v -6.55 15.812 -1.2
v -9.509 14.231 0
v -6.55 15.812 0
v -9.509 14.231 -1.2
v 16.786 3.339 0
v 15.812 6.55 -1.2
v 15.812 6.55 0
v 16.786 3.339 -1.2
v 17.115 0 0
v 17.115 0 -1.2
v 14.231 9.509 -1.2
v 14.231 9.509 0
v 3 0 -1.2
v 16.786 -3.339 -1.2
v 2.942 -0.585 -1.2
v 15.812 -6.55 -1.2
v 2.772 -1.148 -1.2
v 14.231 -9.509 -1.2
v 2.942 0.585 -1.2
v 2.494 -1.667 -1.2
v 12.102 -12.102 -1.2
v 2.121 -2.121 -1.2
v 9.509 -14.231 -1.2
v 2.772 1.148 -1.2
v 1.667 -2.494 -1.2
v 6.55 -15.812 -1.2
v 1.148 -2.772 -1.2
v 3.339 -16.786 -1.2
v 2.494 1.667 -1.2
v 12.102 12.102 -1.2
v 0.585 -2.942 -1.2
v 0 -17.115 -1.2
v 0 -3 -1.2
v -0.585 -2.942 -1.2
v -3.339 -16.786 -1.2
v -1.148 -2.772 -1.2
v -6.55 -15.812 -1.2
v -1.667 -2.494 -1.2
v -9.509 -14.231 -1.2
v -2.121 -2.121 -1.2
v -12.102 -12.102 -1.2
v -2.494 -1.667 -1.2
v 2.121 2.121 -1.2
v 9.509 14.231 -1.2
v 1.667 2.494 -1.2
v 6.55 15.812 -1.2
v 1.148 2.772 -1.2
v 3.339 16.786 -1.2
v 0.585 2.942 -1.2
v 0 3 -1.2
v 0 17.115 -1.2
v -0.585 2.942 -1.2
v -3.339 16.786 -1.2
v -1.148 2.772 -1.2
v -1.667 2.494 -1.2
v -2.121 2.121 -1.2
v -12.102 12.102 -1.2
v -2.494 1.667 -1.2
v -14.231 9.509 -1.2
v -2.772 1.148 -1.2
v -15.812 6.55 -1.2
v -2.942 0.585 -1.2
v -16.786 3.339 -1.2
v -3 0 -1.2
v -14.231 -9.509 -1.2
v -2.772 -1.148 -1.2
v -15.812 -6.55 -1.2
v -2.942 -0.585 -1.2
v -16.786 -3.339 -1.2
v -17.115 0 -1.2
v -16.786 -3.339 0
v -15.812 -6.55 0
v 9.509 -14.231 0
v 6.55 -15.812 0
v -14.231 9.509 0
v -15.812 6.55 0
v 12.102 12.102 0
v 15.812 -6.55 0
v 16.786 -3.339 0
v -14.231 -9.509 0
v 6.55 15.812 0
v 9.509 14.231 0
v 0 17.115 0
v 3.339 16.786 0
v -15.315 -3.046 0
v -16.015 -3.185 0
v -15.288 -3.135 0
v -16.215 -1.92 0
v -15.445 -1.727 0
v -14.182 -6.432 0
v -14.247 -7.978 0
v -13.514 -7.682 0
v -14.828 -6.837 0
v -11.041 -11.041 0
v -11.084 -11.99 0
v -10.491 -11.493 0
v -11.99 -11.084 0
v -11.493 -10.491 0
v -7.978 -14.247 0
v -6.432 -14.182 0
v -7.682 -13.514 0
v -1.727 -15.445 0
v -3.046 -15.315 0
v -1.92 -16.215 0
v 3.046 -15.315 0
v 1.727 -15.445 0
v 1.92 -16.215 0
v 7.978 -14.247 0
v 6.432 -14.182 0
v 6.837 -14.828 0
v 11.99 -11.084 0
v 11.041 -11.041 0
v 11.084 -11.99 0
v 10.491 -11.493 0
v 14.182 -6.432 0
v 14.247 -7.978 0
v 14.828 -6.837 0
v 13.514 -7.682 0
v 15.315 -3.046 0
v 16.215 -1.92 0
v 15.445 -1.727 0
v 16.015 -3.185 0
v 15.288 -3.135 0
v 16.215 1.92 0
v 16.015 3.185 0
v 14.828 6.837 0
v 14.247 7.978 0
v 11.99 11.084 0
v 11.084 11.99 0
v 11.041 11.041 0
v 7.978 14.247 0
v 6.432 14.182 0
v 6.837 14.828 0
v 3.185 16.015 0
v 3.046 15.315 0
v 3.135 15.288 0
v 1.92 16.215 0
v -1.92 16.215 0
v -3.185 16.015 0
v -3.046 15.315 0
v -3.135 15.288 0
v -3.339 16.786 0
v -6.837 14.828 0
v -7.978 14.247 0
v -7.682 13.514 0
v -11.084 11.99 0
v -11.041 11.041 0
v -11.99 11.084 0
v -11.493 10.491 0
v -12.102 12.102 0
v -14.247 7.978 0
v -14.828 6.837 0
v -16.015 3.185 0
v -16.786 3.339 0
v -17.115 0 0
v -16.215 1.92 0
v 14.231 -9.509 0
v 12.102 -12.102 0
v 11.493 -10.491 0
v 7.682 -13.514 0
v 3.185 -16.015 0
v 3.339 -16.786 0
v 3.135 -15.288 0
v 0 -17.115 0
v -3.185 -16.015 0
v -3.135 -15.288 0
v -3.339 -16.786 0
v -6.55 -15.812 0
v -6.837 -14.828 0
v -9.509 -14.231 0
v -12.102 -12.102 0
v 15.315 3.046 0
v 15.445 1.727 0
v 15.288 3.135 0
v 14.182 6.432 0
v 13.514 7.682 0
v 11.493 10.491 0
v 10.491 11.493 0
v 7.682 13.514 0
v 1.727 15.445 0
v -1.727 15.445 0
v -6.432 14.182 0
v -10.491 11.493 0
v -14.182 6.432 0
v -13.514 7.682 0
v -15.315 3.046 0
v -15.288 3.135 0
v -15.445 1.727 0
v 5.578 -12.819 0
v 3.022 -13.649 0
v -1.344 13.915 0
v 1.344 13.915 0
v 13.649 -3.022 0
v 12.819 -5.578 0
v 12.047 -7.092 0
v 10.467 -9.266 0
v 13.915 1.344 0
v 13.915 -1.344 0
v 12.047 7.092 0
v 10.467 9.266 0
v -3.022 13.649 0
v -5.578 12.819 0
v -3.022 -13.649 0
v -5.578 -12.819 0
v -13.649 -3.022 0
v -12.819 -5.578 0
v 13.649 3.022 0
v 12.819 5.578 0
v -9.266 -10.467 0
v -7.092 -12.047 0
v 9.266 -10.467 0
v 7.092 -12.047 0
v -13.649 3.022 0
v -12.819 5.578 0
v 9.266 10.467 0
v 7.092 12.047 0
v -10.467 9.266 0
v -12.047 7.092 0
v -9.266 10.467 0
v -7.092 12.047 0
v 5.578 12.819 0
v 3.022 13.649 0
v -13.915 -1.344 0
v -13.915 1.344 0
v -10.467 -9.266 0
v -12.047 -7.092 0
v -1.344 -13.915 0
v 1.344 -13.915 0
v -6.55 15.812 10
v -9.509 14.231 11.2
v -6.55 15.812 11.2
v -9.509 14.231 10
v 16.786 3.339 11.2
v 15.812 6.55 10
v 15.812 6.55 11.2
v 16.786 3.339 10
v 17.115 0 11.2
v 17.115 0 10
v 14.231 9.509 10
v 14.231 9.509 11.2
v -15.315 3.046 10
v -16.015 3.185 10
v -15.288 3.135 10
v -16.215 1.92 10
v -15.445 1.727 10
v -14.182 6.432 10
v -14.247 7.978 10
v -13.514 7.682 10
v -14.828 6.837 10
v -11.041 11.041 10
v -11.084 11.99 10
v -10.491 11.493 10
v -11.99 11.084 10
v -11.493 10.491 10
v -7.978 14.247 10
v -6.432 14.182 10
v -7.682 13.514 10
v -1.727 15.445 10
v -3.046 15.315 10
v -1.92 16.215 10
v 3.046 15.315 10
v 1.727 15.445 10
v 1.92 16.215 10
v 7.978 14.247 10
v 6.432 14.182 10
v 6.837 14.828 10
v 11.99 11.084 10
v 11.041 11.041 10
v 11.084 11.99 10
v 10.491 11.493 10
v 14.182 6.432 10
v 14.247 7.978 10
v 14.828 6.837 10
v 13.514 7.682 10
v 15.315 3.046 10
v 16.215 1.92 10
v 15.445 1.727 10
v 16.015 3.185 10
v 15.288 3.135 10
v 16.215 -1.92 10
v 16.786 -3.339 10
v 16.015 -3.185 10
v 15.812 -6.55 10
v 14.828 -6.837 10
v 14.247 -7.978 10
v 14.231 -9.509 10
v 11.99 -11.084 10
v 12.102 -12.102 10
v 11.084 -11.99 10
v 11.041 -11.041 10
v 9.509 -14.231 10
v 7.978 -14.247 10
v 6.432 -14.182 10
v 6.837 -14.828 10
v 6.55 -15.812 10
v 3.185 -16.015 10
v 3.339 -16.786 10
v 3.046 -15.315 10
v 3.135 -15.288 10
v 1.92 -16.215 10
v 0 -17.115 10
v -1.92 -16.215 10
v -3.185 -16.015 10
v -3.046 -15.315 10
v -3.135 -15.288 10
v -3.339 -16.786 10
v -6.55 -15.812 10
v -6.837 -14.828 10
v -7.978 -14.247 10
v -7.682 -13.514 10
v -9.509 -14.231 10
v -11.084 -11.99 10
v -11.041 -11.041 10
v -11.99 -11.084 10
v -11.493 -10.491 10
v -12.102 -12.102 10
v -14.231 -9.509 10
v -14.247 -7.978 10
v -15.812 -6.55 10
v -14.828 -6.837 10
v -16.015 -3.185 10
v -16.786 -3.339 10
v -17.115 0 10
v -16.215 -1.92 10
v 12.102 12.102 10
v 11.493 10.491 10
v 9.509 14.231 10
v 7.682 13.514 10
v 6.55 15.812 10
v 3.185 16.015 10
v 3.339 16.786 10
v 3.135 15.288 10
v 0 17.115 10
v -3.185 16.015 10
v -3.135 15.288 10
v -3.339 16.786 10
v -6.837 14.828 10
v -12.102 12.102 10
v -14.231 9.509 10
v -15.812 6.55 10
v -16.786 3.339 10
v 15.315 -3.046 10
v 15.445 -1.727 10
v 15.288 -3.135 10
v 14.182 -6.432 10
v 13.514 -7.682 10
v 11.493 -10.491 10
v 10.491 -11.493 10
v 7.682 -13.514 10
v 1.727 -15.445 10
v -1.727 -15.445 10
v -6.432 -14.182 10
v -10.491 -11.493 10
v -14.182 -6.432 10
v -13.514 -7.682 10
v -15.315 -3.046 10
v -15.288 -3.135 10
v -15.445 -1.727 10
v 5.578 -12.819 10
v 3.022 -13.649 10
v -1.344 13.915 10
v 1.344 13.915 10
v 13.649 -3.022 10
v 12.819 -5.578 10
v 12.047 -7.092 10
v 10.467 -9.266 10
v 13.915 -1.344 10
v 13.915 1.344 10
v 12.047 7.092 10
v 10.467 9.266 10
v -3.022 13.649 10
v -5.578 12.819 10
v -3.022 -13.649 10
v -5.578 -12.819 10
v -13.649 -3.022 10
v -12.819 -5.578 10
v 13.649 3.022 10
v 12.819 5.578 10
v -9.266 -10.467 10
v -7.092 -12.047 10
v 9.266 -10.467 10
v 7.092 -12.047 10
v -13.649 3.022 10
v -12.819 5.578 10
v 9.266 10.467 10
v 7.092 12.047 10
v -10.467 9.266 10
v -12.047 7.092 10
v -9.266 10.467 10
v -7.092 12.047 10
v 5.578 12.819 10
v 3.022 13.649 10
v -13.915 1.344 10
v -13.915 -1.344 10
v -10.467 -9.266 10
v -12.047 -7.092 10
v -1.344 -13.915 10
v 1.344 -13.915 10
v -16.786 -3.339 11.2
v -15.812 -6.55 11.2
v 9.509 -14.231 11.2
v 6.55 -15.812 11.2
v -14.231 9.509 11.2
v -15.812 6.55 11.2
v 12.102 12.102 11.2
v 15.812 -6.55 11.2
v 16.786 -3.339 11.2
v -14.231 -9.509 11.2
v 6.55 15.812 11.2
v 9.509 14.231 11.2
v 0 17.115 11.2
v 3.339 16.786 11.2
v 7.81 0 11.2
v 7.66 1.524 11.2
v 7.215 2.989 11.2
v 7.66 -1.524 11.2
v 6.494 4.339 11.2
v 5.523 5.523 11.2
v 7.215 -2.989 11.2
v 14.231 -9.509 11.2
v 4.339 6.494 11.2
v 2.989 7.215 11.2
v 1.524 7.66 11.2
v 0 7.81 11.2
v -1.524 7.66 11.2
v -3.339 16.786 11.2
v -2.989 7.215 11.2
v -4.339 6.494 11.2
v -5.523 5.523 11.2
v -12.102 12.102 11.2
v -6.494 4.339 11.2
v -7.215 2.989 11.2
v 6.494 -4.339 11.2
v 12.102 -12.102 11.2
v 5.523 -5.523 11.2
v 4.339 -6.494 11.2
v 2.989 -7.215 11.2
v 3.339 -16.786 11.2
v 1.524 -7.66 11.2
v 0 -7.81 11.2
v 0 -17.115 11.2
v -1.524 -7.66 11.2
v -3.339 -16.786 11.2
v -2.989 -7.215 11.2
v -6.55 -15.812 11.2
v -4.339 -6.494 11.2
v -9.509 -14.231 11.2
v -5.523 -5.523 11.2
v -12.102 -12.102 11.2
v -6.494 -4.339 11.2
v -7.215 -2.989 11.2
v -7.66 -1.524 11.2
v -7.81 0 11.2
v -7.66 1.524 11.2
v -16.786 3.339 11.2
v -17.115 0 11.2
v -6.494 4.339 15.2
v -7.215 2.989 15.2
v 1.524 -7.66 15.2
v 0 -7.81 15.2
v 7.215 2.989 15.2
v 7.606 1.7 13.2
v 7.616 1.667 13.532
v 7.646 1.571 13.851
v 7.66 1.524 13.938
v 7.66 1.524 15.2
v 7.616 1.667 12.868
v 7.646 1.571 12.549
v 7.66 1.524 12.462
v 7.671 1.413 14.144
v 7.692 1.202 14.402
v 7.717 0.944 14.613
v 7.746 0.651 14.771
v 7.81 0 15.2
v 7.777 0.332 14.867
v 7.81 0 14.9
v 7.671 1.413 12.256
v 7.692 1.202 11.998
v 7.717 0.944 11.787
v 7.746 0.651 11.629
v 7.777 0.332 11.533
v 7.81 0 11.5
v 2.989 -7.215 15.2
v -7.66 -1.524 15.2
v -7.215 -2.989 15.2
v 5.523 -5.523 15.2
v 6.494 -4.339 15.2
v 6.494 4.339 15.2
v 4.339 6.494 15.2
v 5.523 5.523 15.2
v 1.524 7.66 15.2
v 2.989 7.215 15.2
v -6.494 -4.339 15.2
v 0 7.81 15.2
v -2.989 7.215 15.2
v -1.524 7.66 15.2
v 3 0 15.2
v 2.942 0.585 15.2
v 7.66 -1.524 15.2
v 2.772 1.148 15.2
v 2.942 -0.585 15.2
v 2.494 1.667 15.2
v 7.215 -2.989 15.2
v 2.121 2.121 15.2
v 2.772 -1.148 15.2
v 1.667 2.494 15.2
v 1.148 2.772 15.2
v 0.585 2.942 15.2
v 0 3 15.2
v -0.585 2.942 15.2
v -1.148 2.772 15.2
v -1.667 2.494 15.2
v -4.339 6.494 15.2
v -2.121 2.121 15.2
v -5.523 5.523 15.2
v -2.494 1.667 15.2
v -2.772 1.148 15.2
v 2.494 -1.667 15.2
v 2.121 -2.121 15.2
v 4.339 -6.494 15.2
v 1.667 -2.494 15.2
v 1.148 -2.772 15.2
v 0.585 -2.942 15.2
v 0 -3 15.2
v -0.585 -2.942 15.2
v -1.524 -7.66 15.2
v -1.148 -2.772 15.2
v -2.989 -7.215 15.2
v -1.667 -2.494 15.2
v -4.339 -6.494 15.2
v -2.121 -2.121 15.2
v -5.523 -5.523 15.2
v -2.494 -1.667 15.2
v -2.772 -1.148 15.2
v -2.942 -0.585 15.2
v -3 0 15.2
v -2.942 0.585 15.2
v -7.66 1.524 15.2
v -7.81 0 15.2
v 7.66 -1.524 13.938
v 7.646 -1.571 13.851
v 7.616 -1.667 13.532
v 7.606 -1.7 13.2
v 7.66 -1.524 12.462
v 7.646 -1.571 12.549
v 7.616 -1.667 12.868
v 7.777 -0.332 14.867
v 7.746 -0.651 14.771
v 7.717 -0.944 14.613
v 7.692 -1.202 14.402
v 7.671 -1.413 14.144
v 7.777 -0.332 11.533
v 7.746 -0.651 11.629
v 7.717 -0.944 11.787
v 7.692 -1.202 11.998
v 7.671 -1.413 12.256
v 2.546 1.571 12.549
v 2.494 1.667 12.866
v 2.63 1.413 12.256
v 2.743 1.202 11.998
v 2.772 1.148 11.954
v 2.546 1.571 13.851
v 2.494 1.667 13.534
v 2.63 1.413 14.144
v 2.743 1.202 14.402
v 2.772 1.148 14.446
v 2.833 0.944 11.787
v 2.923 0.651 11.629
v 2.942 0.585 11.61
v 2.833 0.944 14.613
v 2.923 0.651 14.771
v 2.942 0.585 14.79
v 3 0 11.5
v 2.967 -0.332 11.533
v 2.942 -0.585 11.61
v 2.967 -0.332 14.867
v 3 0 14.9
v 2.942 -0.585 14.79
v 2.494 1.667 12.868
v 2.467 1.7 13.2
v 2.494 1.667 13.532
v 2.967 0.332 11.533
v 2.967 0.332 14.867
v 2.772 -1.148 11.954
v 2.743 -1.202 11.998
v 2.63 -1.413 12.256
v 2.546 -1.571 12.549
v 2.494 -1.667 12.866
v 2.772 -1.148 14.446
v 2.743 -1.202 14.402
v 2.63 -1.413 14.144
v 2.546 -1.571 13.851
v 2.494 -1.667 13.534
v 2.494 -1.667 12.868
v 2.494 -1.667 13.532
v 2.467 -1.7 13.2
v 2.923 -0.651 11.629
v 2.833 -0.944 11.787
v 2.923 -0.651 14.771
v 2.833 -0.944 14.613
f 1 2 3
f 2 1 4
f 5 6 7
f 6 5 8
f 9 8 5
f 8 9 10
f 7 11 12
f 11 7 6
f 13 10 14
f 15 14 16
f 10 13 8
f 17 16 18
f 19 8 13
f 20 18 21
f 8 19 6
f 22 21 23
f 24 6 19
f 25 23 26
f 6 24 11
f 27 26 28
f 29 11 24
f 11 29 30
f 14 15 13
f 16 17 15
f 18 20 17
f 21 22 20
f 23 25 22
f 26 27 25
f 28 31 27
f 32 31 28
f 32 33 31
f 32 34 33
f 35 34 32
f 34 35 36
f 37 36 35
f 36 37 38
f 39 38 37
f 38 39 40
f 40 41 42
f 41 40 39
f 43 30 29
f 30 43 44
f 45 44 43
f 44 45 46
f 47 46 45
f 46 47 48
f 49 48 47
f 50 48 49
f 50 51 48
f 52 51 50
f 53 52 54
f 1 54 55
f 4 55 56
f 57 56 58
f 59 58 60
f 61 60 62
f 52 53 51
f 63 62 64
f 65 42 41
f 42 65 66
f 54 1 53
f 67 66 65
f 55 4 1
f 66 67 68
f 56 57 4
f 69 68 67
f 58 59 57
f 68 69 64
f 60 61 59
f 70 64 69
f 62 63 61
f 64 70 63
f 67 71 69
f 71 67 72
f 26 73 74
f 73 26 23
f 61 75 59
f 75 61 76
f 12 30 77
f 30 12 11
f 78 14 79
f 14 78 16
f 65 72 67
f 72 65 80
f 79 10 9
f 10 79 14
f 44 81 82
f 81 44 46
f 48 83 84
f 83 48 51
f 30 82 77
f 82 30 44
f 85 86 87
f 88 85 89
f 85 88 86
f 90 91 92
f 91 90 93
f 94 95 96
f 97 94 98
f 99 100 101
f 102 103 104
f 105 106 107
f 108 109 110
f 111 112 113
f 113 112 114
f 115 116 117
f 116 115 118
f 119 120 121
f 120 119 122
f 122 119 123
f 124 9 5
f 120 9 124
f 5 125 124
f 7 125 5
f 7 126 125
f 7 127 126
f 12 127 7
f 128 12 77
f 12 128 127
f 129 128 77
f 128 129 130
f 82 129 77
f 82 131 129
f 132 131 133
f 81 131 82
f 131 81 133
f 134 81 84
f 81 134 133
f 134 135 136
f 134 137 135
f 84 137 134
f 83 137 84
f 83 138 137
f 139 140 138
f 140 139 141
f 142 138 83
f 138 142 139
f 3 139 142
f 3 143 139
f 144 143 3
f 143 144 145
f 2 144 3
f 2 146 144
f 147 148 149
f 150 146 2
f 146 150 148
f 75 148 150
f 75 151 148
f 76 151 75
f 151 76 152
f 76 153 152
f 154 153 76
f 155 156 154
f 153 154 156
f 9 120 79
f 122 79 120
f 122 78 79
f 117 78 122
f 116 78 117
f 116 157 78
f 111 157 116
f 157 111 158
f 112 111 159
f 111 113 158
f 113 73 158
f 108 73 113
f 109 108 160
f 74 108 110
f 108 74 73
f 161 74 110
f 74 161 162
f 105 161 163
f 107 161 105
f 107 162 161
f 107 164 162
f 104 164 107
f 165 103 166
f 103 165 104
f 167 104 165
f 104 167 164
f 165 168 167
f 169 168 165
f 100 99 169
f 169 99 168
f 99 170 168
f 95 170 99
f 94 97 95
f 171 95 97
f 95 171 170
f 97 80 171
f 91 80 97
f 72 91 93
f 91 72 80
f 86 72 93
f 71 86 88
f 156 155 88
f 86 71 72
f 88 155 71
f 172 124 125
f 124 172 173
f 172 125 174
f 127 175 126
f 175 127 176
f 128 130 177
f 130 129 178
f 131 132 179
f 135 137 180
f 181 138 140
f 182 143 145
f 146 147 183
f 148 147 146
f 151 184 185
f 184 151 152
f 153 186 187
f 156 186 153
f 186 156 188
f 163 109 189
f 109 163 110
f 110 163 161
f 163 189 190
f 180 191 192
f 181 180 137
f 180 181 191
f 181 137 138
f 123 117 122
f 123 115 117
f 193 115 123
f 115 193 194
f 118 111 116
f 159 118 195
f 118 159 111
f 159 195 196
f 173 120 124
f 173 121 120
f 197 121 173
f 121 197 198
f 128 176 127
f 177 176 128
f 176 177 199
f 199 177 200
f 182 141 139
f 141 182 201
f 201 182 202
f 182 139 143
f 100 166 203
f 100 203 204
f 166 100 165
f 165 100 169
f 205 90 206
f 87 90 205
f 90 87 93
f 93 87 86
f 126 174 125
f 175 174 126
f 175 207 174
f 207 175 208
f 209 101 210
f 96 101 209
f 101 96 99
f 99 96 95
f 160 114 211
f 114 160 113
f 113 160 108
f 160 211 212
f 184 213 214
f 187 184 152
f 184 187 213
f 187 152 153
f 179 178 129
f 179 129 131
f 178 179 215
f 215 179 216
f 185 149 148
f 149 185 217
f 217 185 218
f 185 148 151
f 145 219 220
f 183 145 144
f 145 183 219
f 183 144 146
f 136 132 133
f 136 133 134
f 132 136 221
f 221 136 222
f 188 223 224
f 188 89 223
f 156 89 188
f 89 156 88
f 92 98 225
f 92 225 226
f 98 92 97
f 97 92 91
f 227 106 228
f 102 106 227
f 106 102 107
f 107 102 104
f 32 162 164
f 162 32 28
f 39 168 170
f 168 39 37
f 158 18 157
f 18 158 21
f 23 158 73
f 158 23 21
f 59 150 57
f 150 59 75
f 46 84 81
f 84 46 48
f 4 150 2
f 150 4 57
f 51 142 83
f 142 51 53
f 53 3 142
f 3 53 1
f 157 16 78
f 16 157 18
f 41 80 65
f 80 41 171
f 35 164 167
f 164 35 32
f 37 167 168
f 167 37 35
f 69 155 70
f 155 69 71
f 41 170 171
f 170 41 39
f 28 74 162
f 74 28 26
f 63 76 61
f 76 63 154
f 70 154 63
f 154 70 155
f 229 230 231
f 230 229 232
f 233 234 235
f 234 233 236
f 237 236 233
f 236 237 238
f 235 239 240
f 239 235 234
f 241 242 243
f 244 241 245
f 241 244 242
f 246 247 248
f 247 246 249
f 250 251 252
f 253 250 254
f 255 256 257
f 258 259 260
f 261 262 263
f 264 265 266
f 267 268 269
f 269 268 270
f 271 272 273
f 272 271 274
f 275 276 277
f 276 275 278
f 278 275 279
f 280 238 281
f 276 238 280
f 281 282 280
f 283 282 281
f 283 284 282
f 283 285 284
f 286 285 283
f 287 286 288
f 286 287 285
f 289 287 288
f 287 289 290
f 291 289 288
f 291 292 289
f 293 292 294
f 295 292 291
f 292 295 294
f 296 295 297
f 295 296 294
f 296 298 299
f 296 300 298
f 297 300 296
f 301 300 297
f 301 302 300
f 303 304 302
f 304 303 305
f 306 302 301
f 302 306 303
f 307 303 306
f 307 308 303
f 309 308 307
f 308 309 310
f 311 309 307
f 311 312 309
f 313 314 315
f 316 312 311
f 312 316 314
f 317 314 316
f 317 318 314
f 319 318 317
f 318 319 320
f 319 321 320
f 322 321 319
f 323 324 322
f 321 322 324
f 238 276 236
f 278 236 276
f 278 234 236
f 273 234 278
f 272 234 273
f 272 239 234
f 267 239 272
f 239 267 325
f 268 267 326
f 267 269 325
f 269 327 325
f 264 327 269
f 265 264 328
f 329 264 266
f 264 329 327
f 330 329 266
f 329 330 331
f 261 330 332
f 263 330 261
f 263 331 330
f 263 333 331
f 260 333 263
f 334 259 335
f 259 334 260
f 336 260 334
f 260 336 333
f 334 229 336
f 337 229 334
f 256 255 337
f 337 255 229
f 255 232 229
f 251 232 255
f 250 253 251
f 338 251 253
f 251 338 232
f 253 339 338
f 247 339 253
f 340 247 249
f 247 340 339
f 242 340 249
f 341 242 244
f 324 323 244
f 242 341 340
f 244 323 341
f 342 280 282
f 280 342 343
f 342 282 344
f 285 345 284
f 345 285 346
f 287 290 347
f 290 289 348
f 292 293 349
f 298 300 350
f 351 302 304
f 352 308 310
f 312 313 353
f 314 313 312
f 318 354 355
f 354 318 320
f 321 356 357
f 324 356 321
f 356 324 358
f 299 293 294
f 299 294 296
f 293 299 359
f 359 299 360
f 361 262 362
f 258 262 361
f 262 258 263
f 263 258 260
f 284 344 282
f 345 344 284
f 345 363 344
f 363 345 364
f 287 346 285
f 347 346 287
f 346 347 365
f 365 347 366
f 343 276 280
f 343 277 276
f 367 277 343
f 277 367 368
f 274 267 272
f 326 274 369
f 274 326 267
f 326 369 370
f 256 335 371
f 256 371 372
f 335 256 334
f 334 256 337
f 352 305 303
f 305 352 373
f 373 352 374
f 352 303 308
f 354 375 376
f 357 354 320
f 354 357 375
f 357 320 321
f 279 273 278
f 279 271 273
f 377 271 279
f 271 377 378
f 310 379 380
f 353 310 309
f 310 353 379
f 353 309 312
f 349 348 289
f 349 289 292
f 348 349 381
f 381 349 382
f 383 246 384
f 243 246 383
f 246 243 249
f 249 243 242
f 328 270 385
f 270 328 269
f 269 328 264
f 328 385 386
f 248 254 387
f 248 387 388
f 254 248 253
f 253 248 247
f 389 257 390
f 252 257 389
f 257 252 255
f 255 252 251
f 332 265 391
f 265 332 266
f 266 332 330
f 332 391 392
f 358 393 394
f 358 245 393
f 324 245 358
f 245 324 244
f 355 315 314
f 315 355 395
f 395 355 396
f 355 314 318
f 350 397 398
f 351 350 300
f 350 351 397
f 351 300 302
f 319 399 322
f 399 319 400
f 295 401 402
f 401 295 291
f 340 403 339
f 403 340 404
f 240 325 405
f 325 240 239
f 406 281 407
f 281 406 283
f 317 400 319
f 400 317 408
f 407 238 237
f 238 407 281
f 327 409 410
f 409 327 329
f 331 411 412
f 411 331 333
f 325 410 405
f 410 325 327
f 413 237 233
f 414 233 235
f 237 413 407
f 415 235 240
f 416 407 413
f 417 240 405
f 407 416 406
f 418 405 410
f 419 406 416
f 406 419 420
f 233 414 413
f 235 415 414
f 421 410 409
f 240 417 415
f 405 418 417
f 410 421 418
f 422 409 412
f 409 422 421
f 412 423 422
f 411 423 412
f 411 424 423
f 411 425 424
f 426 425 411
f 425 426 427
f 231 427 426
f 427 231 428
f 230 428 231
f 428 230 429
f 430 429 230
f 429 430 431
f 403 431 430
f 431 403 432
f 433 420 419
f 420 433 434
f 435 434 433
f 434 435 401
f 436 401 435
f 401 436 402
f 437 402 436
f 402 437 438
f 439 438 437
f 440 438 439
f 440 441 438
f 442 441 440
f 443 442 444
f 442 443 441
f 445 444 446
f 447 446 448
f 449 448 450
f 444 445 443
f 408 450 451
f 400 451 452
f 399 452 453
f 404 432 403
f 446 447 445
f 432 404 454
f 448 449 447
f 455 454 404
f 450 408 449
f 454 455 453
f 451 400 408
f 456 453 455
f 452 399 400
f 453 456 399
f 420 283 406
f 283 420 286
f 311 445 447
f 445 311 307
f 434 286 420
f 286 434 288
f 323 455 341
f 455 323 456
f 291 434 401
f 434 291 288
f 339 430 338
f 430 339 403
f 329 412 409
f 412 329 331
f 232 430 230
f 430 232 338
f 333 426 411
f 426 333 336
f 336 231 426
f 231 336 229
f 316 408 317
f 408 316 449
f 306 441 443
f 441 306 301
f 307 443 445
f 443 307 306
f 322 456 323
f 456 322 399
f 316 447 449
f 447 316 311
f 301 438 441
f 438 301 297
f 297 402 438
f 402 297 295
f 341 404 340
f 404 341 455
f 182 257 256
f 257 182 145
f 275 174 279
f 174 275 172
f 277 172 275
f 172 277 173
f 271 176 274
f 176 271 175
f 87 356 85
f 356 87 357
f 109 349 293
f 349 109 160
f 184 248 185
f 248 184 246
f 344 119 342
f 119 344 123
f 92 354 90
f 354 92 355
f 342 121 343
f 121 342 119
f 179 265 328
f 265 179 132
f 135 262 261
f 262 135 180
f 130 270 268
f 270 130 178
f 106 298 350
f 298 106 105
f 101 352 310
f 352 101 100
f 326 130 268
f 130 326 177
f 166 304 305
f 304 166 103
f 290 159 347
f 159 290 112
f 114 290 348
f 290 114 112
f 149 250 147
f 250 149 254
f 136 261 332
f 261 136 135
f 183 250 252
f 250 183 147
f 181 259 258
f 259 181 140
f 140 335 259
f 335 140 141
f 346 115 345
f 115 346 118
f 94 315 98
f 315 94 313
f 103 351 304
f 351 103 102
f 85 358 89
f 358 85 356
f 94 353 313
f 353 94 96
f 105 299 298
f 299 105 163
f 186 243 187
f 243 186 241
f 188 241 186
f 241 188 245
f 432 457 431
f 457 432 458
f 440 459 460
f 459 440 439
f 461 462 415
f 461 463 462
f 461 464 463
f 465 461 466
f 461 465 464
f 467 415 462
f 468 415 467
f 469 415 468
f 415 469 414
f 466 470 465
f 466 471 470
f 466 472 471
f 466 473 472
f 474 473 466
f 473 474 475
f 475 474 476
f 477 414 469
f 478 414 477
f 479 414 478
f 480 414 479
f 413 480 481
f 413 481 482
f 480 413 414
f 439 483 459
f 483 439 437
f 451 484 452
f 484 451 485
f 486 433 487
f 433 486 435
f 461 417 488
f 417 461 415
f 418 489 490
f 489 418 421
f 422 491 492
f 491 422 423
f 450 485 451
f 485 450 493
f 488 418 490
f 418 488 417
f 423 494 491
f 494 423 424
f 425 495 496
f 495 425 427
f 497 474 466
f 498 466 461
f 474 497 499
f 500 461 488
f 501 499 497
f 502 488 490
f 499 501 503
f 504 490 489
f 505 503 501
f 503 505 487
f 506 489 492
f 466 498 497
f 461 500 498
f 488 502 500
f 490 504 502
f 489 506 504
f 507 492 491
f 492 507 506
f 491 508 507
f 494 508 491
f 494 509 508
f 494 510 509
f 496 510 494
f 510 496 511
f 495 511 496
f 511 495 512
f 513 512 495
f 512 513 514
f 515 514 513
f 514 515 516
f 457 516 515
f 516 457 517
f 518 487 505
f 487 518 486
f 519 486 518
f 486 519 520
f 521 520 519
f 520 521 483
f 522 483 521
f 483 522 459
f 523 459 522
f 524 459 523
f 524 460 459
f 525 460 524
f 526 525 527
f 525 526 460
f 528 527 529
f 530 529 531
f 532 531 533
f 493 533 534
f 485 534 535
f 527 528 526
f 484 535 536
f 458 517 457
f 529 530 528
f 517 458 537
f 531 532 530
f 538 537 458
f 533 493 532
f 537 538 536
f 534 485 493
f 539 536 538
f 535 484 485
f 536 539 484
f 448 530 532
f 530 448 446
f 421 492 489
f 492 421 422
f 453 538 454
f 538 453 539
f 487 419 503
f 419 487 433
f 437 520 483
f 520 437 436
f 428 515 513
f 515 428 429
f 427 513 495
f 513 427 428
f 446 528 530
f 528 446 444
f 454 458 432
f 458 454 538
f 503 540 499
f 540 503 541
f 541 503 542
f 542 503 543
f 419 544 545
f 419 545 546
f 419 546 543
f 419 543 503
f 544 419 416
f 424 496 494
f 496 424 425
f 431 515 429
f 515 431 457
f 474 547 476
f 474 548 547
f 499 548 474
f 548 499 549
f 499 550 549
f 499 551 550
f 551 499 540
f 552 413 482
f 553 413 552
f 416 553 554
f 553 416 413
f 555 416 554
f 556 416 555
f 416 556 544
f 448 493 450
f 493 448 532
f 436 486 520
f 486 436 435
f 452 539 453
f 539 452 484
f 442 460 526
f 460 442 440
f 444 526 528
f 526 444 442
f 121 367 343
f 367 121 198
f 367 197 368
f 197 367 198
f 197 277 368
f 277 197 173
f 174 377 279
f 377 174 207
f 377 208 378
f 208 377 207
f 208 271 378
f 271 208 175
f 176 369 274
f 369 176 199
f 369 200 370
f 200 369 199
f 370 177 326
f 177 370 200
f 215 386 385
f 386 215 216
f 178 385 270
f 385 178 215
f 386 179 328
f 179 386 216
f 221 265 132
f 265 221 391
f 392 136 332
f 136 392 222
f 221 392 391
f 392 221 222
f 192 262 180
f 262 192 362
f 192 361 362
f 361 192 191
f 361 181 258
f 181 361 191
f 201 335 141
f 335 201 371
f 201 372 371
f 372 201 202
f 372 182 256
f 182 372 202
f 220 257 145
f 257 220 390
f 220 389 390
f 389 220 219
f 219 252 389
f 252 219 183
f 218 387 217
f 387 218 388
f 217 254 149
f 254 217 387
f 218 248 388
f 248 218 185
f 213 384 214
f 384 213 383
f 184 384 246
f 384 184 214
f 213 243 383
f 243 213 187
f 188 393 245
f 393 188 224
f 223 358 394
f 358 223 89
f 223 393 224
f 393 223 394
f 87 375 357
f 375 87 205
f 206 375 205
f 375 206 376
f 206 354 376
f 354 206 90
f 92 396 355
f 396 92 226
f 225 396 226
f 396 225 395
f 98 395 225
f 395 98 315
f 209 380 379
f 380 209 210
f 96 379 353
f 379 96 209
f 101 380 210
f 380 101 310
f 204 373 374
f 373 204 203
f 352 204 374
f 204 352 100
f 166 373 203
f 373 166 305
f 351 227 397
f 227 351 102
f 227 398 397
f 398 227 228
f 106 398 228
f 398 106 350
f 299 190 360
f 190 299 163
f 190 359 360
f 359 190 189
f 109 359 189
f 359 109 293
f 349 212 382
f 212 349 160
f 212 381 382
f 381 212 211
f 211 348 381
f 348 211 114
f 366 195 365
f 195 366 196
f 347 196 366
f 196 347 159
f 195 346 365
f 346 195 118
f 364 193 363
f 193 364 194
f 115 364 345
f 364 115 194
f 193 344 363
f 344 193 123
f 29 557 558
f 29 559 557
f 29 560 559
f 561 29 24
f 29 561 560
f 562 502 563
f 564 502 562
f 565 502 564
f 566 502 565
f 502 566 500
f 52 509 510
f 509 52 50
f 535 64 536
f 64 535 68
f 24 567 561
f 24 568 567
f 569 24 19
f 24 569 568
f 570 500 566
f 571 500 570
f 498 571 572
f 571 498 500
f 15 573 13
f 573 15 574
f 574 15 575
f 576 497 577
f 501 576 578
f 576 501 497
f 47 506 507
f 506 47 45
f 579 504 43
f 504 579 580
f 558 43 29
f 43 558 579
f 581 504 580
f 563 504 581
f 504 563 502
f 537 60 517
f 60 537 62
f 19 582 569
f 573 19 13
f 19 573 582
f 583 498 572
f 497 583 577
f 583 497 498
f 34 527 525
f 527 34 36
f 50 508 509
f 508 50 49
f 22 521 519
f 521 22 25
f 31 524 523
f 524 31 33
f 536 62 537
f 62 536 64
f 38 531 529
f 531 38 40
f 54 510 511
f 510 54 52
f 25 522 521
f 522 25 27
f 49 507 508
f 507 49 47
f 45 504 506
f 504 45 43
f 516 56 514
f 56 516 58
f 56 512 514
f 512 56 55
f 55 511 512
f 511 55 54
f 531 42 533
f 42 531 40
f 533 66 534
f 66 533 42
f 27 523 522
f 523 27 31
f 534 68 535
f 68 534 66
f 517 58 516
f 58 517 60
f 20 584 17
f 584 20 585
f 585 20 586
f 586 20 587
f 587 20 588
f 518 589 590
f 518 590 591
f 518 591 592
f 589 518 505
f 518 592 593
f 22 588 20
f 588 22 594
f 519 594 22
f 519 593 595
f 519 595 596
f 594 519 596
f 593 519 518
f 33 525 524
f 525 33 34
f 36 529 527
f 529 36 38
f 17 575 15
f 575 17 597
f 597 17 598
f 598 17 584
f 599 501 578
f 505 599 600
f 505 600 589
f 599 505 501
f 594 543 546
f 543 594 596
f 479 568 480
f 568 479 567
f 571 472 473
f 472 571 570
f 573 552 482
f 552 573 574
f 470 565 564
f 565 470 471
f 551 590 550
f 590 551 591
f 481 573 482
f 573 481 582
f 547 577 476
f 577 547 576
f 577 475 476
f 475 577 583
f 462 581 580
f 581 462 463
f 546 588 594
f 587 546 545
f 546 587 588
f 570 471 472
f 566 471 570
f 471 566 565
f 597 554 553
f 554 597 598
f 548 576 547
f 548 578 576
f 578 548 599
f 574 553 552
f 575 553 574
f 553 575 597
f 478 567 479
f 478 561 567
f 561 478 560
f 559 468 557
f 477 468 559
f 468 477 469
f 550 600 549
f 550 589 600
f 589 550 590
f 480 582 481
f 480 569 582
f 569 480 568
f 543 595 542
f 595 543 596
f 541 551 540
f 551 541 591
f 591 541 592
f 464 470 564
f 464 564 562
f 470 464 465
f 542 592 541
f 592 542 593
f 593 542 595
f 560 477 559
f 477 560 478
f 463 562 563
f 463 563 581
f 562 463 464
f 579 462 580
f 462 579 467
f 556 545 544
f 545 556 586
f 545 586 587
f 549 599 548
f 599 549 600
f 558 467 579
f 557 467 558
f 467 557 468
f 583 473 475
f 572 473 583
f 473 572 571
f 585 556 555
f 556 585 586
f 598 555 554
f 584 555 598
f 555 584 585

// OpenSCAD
$fn = 32;

// ----------------------------------------------------------------------
// Timing pulley: HTD5 20T, pitch 5 mm, 34.23 mm x 16.4 mm
// ----------------------------------------------------------------------

// --- parameters (mm) ---
pitch = 5;                // belt pitch
teeth = 20;               // number of grooves
belt_w = 10;              // belt width between the flanges
tip_d = 31.23;            // tip circle diameter
root_d = 29.03;           // groove bottom diameter
groove_h = 1.1;           // groove depth
tooth_w = 3.2;            // groove width at the tip circle
flange_d = 34.23;         // flange diameter
flange_t = 1.2;           // flange thickness
spigot_d = 27.43;         // flange spigot, sunk into the rim
spigot_h = 1.2;           // spigot depth into the rim
bore_d = 6;               // shaft bore
hub_d = 15.62;            // hub diameter
hub_h = 4;                // hub above the flange
bottom_z = -1.2;          // lowest point of the pulley
top_z = 15.2;             // highest point of the pulley
set_d = 3.4;              // set screw tap hole

module rim() {
  cylinder(h = belt_w, d = tip_d);
}

module groove_cutter() {
  /* belt tooth groove: deeper than wide, cut through the belt width */
  translate([root_d / 2, 0, 0])
    linear_extrude(height = belt_w)
      polygon(points = [[-0.6, -tooth_w * 0.42], [groove_h + 0.6, -tooth_w * 0.6],
                        [groove_h + 0.6, tooth_w * 0.6], [-0.6, tooth_w * 0.42]]);
}

module flanges() {
  translate([0, 0, -flange_t]) cylinder(h = flange_t, d = flange_d);
  translate([0, 0, belt_w]) cylinder(h = flange_t, d = flange_d);
  translate([0, 0, -spigot_h]) cylinder(h = spigot_h + 0.6, d = spigot_d);
  translate([0, 0, belt_w - 0.6]) cylinder(h = spigot_h + 0.6, d = spigot_d);
}

module hub() {
  translate([0, 0, bottom_z]) cylinder(h = top_z - bottom_z, d = hub_d);
}

difference() {
  union() {
    rim();
    hub();
    flanges();
  }
  for (i = [0 : teeth - 1]) rotate([0, 0, i * 360 / teeth]) groove_cutter();
  translate([0, 0, bottom_z - 1]) cylinder(h = top_z - bottom_z + 2, d = bore_d);
  translate([-1, 0, top_z - hub_h * 0.5]) rotate([0, 90, 0]) cylinder(h = hub_d / 2 + 3, d = set_d);
}
